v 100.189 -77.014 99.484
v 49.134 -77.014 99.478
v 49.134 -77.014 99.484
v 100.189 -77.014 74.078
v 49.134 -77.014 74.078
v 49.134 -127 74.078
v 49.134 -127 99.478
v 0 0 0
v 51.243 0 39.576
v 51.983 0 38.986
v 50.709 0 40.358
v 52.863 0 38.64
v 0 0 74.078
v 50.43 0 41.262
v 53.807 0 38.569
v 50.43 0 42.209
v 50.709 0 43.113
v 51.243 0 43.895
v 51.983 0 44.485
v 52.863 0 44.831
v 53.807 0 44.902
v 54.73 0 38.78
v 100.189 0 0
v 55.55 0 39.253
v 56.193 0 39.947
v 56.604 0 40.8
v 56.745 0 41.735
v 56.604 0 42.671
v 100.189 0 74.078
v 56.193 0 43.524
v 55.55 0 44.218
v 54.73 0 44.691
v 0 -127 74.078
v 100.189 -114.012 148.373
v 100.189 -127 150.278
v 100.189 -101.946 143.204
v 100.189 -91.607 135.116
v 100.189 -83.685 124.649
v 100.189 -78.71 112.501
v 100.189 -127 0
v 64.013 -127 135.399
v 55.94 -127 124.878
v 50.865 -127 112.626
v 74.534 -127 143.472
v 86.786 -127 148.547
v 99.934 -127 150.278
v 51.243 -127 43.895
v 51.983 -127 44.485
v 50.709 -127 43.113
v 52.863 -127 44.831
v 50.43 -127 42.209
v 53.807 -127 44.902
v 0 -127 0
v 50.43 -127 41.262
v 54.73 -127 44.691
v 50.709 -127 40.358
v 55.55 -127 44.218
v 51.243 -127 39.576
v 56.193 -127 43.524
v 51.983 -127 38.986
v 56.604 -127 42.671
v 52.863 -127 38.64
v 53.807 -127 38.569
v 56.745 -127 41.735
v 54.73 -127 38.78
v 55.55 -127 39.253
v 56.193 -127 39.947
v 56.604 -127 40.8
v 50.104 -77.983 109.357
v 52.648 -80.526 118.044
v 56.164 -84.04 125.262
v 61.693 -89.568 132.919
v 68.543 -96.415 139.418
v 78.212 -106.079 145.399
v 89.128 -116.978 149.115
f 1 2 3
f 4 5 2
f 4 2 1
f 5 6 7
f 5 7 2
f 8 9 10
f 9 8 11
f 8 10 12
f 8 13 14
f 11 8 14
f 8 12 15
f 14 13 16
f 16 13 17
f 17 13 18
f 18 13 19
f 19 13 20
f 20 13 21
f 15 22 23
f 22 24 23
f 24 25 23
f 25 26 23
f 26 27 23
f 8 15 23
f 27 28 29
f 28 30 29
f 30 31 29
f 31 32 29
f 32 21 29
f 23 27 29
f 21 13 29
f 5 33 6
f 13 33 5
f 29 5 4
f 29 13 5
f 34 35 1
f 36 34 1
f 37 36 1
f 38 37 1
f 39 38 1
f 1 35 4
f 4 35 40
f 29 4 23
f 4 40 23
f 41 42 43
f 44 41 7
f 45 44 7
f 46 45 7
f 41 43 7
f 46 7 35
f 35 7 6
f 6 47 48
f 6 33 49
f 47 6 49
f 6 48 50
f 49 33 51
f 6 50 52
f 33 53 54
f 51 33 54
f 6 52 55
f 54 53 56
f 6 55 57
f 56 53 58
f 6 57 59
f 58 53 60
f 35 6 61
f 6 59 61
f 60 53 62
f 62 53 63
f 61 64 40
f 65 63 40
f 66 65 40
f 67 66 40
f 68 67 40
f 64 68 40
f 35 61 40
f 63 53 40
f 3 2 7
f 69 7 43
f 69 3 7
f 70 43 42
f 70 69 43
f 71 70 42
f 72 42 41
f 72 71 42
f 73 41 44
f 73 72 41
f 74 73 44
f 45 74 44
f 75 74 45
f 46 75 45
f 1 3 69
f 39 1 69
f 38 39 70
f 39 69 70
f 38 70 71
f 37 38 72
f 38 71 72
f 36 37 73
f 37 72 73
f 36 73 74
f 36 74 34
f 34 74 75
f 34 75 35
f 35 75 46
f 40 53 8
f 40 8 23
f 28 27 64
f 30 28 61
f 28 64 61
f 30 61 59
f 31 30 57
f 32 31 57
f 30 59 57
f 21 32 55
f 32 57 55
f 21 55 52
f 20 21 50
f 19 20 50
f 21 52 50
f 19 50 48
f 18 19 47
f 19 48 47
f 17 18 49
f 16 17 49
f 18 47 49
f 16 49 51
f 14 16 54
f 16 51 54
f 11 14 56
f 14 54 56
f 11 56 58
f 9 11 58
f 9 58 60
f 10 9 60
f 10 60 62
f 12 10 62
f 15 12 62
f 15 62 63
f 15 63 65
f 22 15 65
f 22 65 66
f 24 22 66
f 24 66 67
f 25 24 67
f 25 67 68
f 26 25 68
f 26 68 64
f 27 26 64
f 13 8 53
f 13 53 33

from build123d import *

# Parameters (mm, degrees)
F0_W        = 100.18889606
F0_H        = 74.0776211023
F1_DEPTH    = 127
F2_W        = 51.0549172759
F2_H        = 49.9856282473
F3_DEPTH    = 76.2
F4_T1_DEPTH = 305.0222773169
F4_T3_DEPTH = 303.9856282473
F6_D        = 6.35


# Not quite as in the source:
# - a fillet or chamfer that OpenCascade refuses, or shapes differently, is made with other operations: its cross-section is extruded or revolved along the edge and cut away or added


with BuildPart() as f1:
    # F0 (on Front) → F1 (new body)
    with BuildSketch(Plane.XZ):
        with Locations((50.09444803, 37.0388105512)):
            Rectangle(F0_W, F0_H)
    extrude(amount=F1_DEPTH)

    # F2 (on face) → F3 (join)
    with BuildSketch(Plane.XY.offset(74.0776211023)):
        with Locations((74.661437422, -102.0071858764)):
            Rectangle(F2_W, F2_H)
    extrude(amount=F3_DEPTH)

    # F4: fillet of radius 50.8 on 2 edges, made by hand

    # F4_s2 → F4_t1 (cut)
    with BuildSketch(Plane.YZ.offset(-77.8497012364)):
        with BuildLine():
            ThreePointArc((-77.0143717527, 99.4841490941), (-91.6065681392, 135.1160864184), (-127, 150.2776211023))
            Line((-127, 150.2776211023), (-77.0143717527, 150.2776211023))
            Line((-77.0143717527, 150.2776211023), (-77.0143717527, 99.4841490941))
        make_face()
    extrude(amount=F4_T1_DEPTH, mode=Mode.SUBTRACT)

    # F4_s4 → F4_t3 (cut)
    with BuildSketch(Plane.XZ.offset(-49.9856282473)):
        with BuildLine():
            ThreePointArc((49.1339787841, 99.4776211023), (64.0129542998, 135.3986455866), (99.9339787841, 150.2776211023))
            Line((99.9339787841, 150.2776211023), (49.1339787841, 150.2776211023))
            Line((49.1339787841, 150.2776211023), (49.1339787841, 99.4776211023))
        make_face()
    extrude(amount=F4_T3_DEPTH, mode=Mode.SUBTRACT)

    # F6 (through all)
    with Locations(Plane(origin=(0, 0, 0), x_dir=(-1, 0, 0), z_dir=(0, 1, 0))):
        with Locations((-53.5700023174, 41.735380888)):
            Hole(F6_D / 2)


solid = f1.part
